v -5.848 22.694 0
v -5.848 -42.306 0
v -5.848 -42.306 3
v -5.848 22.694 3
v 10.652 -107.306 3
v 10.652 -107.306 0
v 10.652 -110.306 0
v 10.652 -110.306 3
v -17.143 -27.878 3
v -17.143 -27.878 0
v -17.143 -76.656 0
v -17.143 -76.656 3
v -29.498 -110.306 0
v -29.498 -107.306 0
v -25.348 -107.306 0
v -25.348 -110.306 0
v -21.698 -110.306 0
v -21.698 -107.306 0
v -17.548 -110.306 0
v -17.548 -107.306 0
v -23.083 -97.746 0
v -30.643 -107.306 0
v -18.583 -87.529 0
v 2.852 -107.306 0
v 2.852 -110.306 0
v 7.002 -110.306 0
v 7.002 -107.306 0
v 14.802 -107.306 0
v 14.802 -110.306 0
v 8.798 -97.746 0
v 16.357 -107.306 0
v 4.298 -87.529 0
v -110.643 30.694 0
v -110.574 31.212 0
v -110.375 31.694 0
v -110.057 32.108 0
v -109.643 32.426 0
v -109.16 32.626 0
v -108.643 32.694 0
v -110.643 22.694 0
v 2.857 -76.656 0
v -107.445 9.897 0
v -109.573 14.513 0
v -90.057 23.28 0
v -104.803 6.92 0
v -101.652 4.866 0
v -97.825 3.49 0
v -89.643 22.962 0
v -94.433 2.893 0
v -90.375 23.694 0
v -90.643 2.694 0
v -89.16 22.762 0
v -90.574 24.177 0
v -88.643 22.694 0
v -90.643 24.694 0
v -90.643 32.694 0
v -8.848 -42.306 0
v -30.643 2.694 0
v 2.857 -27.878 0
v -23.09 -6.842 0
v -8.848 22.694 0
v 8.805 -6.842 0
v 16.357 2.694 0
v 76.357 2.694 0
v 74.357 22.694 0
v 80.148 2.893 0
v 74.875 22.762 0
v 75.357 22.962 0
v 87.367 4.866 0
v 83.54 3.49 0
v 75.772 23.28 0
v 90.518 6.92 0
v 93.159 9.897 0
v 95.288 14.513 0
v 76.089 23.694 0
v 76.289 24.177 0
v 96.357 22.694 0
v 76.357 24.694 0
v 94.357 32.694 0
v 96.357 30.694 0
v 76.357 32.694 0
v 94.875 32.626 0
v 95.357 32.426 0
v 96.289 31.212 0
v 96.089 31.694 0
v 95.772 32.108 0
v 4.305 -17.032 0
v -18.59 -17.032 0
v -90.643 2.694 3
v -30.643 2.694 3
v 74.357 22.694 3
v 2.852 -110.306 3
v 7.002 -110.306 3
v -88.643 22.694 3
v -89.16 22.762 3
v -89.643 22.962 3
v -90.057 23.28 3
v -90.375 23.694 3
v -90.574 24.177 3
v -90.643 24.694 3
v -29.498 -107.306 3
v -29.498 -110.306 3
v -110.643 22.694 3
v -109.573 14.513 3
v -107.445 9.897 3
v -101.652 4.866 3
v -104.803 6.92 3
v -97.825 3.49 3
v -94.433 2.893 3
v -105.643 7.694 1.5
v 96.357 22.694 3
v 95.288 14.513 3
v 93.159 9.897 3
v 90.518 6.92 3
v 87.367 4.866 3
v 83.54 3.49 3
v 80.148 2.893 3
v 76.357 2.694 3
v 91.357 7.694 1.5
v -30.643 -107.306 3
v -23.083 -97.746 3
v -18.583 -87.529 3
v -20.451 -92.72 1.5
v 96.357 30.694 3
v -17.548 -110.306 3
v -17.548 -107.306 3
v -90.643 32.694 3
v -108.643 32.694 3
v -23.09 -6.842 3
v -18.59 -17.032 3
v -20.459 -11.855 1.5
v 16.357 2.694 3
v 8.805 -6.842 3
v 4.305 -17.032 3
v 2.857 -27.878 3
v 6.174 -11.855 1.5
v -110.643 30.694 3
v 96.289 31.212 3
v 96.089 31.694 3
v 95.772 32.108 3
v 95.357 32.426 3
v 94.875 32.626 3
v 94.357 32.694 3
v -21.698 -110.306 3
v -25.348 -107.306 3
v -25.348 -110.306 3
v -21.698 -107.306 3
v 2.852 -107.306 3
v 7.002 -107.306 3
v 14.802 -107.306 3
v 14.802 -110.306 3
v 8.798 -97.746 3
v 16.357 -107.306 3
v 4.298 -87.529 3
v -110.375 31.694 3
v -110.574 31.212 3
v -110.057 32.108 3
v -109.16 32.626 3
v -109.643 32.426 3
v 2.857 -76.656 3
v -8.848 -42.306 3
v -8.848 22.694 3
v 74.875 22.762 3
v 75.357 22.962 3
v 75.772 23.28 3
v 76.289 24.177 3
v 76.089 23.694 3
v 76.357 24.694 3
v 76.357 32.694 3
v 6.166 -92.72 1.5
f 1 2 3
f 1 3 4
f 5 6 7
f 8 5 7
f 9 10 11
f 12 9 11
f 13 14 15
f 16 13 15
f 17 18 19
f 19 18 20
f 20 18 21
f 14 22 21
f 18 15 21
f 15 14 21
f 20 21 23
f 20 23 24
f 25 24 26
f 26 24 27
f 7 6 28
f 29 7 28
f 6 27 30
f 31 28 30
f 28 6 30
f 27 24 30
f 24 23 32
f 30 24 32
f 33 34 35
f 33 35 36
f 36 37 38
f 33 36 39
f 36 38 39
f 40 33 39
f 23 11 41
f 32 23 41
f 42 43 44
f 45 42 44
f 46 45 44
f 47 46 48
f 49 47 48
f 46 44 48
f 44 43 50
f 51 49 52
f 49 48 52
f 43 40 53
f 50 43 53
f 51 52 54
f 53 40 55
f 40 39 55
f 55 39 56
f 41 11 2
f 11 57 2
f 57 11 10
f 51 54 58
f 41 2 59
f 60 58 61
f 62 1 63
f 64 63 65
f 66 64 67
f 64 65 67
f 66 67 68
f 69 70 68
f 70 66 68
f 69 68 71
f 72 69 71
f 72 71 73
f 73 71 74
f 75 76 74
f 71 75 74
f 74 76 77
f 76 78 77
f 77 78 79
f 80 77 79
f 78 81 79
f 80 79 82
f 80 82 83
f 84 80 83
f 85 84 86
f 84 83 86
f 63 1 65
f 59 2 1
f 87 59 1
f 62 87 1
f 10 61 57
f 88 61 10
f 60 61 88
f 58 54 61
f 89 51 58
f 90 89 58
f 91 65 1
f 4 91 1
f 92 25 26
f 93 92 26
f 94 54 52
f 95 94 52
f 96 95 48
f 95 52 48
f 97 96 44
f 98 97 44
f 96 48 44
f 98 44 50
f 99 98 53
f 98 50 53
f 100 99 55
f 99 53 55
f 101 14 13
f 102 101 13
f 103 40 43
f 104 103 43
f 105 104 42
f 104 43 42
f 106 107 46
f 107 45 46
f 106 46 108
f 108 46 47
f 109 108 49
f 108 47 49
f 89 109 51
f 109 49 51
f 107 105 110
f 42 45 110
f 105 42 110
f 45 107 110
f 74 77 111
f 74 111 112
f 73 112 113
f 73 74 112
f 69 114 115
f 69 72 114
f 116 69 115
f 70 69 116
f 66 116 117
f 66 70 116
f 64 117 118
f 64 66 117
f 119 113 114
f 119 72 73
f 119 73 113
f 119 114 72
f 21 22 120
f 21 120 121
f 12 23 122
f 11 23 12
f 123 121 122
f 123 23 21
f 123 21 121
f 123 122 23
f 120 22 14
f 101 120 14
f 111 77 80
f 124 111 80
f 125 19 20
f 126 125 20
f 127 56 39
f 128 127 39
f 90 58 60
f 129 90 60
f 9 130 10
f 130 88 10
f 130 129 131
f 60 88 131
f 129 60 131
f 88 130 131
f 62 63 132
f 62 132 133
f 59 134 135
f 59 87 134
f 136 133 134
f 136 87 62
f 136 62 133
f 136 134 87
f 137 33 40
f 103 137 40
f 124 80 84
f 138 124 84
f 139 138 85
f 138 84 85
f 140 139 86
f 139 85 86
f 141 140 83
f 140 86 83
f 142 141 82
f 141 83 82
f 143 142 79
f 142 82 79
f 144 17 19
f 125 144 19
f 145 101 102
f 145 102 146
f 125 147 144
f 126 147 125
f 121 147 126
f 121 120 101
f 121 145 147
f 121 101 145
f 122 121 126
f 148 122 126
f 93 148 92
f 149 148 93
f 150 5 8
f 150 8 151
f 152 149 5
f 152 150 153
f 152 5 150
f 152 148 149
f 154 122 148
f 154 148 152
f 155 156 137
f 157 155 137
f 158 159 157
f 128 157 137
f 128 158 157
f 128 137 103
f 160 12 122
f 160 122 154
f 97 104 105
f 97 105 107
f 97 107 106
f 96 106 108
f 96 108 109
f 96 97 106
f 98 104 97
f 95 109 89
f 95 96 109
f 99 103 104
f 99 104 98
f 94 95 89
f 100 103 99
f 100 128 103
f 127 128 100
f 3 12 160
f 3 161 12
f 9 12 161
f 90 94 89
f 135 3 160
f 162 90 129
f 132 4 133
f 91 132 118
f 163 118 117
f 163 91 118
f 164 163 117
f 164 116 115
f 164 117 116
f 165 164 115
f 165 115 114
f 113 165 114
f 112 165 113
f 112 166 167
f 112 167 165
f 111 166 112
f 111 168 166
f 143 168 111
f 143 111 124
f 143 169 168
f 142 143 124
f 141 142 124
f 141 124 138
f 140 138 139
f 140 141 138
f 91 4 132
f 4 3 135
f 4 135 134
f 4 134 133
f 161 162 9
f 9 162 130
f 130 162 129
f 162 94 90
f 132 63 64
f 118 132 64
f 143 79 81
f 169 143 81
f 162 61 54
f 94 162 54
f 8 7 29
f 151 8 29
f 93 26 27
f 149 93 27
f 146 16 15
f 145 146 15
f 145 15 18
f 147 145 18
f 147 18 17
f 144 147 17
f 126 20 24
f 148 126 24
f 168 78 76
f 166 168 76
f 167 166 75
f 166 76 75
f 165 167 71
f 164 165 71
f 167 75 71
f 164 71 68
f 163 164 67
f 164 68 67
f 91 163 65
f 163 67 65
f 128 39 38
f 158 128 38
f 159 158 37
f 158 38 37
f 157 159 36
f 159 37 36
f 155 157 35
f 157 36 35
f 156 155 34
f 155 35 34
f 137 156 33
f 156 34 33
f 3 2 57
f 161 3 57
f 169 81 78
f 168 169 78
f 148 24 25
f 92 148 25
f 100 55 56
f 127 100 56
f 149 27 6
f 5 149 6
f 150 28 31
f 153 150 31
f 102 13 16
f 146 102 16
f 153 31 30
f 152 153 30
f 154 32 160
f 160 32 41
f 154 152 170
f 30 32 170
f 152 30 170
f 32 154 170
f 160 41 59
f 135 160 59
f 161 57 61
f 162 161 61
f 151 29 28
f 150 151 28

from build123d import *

# Parameters (mm, degrees)
P_IDAT_VYSUNUT_M2_DEPTH  = 3
SKICA2_W                 = 3
SKICA2_H                 = 65
ODEBRAT_VYSUNUT_M3_DEPTH = 3


with BuildPart() as part:
    # Skica1 → Přidat vysunutím2 (new body)
    with BuildSketch(Plane.XY):
        with BuildLine():
            Line((-90.642636358, 2.694256757), (-30.642636358, 2.694256757))
            add(Edge.make_bspline(
                [(-30.642636358, 2.694256757), (-17.025139471, -11.118063286), (-17.142636358, -27.878389443)],
                knots=[0, 0, 0, 1, 1, 1], degree=2))
            Line((-17.142636358, -27.878389443), (-17.142636358, -76.655981804))
            add(Edge.make_bspline(
                [(-30.642636358, -107.305743243), (-17.009316786, -93.458261678), (-17.142636358, -76.655981804)],
                knots=[0, 0, 0, 1, 1, 1], degree=2))
            Line((-30.642636358, -107.305743243), (-29.497972973, -107.305743243))
            Line((-29.497972973, -107.305743243), (-29.497972973, -110.305743243))
            Line((-29.497972973, -110.305743243), (-25.347972973, -110.305743243))
            Line((-25.347972973, -110.305743243), (-25.347972973, -107.305743243))
            Line((-25.347972973, -107.305743243), (-21.697972973, -107.305743243))
            Line((-21.697972973, -107.305743243), (-21.697972973, -110.305743243))
            Line((-21.697972973, -110.305743243), (-17.547972973, -110.305743243))
            Line((-17.547972973, -110.305743243), (-17.547972973, -107.305743243))
            Line((-17.547972973, -107.305743243), (2.852027027, -107.305743243))
            Line((2.852027027, -107.305743243), (2.852027027, -110.305743243))
            Line((2.852027027, -110.305743243), (7.002027027, -110.305743243))
            Line((7.002027027, -110.305743243), (7.002027027, -107.305743243))
            Line((7.002027027, -107.305743243), (10.652027027, -107.305743243))
            Line((10.652027027, -107.305743243), (10.652027027, -110.305743243))
            Line((10.652027027, -110.305743243), (14.802027027, -110.305743243))
            Line((14.802027027, -110.305743243), (14.802027027, -107.305743243))
            Line((14.802027027, -107.305743243), (16.357363642, -107.305743243))
            add(Edge.make_bspline(
                [(16.357363642, -107.305743243), (2.72404407, -93.458261678), (2.857363642, -76.655981804)],
                knots=[0, 0, 0, 1, 1, 1], degree=2))
            Line((2.857363642, -76.655981804), (2.857363642, -27.878389443))
            add(Edge.make_bspline(
                [(16.357363642, 2.694256757), (2.739866756, -11.118063286), (2.857363642, -27.878389443)],
                knots=[0, 0, 0, 1, 1, 1], degree=2))
            Line((16.357363642, 2.694256757), (76.357363642, 2.694256757))
            add(Edge.make_bspline(
                [(96.357363642, 22.694256757), (96.357363642, 2.694256757), (76.357363642, 2.694256757)],
                knots=[0, 0, 0, 1, 1, 1], degree=2))
            Line((96.357363642, 22.694256757), (96.357363642, 30.694256757))
            ThreePointArc((96.357363642, 30.694256757), (95.771577204, 32.108470319), (94.357363642, 32.694256757))
            Line((94.357363642, 32.694256757), (76.357363642, 32.694256757))
            Line((76.357363642, 32.694256757), (76.357363642, 24.694256757))
            ThreePointArc((76.357363642, 24.694256757), (75.771577204, 23.280043194), (74.357363642, 22.694256757))
            Line((74.357363642, 22.694256757), (-88.642636358, 22.694256757))
            ThreePointArc((-88.642636358, 22.694256757), (-90.05684992, 23.280043194), (-90.642636358, 24.694256757))
            Line((-90.642636358, 24.694256757), (-90.642636358, 32.694256757))
            Line((-90.642636358, 32.694256757), (-108.642636358, 32.694256757))
            ThreePointArc((-108.642636358, 32.694256757), (-110.05684992, 32.108470319), (-110.642636358, 30.694256757))
            Line((-110.642636358, 30.694256757), (-110.642636358, 22.694256757))
            add(Edge.make_bspline(
                [(-110.642636358, 22.694256757), (-110.642636358, 2.694256757), (-90.642636358, 2.694256757)],
                knots=[0, 0, 0, 1, 1, 1], degree=2))
        make_face()
    extrude(amount=P_IDAT_VYSUNUT_M2_DEPTH)

    # Skica2 → Odebrat vysunutím3 (cut)
    with BuildSketch(Plane(origin=(0, 0, 0), x_dir=(-1, 0, 0), z_dir=(0, 0, -1))):
        with Locations((7.347972973, -9.805743243)):
            Rectangle(SKICA2_W, SKICA2_H)
    extrude(amount=-ODEBRAT_VYSUNUT_M3_DEPTH, mode=Mode.SUBTRACT)


solid = part.part
